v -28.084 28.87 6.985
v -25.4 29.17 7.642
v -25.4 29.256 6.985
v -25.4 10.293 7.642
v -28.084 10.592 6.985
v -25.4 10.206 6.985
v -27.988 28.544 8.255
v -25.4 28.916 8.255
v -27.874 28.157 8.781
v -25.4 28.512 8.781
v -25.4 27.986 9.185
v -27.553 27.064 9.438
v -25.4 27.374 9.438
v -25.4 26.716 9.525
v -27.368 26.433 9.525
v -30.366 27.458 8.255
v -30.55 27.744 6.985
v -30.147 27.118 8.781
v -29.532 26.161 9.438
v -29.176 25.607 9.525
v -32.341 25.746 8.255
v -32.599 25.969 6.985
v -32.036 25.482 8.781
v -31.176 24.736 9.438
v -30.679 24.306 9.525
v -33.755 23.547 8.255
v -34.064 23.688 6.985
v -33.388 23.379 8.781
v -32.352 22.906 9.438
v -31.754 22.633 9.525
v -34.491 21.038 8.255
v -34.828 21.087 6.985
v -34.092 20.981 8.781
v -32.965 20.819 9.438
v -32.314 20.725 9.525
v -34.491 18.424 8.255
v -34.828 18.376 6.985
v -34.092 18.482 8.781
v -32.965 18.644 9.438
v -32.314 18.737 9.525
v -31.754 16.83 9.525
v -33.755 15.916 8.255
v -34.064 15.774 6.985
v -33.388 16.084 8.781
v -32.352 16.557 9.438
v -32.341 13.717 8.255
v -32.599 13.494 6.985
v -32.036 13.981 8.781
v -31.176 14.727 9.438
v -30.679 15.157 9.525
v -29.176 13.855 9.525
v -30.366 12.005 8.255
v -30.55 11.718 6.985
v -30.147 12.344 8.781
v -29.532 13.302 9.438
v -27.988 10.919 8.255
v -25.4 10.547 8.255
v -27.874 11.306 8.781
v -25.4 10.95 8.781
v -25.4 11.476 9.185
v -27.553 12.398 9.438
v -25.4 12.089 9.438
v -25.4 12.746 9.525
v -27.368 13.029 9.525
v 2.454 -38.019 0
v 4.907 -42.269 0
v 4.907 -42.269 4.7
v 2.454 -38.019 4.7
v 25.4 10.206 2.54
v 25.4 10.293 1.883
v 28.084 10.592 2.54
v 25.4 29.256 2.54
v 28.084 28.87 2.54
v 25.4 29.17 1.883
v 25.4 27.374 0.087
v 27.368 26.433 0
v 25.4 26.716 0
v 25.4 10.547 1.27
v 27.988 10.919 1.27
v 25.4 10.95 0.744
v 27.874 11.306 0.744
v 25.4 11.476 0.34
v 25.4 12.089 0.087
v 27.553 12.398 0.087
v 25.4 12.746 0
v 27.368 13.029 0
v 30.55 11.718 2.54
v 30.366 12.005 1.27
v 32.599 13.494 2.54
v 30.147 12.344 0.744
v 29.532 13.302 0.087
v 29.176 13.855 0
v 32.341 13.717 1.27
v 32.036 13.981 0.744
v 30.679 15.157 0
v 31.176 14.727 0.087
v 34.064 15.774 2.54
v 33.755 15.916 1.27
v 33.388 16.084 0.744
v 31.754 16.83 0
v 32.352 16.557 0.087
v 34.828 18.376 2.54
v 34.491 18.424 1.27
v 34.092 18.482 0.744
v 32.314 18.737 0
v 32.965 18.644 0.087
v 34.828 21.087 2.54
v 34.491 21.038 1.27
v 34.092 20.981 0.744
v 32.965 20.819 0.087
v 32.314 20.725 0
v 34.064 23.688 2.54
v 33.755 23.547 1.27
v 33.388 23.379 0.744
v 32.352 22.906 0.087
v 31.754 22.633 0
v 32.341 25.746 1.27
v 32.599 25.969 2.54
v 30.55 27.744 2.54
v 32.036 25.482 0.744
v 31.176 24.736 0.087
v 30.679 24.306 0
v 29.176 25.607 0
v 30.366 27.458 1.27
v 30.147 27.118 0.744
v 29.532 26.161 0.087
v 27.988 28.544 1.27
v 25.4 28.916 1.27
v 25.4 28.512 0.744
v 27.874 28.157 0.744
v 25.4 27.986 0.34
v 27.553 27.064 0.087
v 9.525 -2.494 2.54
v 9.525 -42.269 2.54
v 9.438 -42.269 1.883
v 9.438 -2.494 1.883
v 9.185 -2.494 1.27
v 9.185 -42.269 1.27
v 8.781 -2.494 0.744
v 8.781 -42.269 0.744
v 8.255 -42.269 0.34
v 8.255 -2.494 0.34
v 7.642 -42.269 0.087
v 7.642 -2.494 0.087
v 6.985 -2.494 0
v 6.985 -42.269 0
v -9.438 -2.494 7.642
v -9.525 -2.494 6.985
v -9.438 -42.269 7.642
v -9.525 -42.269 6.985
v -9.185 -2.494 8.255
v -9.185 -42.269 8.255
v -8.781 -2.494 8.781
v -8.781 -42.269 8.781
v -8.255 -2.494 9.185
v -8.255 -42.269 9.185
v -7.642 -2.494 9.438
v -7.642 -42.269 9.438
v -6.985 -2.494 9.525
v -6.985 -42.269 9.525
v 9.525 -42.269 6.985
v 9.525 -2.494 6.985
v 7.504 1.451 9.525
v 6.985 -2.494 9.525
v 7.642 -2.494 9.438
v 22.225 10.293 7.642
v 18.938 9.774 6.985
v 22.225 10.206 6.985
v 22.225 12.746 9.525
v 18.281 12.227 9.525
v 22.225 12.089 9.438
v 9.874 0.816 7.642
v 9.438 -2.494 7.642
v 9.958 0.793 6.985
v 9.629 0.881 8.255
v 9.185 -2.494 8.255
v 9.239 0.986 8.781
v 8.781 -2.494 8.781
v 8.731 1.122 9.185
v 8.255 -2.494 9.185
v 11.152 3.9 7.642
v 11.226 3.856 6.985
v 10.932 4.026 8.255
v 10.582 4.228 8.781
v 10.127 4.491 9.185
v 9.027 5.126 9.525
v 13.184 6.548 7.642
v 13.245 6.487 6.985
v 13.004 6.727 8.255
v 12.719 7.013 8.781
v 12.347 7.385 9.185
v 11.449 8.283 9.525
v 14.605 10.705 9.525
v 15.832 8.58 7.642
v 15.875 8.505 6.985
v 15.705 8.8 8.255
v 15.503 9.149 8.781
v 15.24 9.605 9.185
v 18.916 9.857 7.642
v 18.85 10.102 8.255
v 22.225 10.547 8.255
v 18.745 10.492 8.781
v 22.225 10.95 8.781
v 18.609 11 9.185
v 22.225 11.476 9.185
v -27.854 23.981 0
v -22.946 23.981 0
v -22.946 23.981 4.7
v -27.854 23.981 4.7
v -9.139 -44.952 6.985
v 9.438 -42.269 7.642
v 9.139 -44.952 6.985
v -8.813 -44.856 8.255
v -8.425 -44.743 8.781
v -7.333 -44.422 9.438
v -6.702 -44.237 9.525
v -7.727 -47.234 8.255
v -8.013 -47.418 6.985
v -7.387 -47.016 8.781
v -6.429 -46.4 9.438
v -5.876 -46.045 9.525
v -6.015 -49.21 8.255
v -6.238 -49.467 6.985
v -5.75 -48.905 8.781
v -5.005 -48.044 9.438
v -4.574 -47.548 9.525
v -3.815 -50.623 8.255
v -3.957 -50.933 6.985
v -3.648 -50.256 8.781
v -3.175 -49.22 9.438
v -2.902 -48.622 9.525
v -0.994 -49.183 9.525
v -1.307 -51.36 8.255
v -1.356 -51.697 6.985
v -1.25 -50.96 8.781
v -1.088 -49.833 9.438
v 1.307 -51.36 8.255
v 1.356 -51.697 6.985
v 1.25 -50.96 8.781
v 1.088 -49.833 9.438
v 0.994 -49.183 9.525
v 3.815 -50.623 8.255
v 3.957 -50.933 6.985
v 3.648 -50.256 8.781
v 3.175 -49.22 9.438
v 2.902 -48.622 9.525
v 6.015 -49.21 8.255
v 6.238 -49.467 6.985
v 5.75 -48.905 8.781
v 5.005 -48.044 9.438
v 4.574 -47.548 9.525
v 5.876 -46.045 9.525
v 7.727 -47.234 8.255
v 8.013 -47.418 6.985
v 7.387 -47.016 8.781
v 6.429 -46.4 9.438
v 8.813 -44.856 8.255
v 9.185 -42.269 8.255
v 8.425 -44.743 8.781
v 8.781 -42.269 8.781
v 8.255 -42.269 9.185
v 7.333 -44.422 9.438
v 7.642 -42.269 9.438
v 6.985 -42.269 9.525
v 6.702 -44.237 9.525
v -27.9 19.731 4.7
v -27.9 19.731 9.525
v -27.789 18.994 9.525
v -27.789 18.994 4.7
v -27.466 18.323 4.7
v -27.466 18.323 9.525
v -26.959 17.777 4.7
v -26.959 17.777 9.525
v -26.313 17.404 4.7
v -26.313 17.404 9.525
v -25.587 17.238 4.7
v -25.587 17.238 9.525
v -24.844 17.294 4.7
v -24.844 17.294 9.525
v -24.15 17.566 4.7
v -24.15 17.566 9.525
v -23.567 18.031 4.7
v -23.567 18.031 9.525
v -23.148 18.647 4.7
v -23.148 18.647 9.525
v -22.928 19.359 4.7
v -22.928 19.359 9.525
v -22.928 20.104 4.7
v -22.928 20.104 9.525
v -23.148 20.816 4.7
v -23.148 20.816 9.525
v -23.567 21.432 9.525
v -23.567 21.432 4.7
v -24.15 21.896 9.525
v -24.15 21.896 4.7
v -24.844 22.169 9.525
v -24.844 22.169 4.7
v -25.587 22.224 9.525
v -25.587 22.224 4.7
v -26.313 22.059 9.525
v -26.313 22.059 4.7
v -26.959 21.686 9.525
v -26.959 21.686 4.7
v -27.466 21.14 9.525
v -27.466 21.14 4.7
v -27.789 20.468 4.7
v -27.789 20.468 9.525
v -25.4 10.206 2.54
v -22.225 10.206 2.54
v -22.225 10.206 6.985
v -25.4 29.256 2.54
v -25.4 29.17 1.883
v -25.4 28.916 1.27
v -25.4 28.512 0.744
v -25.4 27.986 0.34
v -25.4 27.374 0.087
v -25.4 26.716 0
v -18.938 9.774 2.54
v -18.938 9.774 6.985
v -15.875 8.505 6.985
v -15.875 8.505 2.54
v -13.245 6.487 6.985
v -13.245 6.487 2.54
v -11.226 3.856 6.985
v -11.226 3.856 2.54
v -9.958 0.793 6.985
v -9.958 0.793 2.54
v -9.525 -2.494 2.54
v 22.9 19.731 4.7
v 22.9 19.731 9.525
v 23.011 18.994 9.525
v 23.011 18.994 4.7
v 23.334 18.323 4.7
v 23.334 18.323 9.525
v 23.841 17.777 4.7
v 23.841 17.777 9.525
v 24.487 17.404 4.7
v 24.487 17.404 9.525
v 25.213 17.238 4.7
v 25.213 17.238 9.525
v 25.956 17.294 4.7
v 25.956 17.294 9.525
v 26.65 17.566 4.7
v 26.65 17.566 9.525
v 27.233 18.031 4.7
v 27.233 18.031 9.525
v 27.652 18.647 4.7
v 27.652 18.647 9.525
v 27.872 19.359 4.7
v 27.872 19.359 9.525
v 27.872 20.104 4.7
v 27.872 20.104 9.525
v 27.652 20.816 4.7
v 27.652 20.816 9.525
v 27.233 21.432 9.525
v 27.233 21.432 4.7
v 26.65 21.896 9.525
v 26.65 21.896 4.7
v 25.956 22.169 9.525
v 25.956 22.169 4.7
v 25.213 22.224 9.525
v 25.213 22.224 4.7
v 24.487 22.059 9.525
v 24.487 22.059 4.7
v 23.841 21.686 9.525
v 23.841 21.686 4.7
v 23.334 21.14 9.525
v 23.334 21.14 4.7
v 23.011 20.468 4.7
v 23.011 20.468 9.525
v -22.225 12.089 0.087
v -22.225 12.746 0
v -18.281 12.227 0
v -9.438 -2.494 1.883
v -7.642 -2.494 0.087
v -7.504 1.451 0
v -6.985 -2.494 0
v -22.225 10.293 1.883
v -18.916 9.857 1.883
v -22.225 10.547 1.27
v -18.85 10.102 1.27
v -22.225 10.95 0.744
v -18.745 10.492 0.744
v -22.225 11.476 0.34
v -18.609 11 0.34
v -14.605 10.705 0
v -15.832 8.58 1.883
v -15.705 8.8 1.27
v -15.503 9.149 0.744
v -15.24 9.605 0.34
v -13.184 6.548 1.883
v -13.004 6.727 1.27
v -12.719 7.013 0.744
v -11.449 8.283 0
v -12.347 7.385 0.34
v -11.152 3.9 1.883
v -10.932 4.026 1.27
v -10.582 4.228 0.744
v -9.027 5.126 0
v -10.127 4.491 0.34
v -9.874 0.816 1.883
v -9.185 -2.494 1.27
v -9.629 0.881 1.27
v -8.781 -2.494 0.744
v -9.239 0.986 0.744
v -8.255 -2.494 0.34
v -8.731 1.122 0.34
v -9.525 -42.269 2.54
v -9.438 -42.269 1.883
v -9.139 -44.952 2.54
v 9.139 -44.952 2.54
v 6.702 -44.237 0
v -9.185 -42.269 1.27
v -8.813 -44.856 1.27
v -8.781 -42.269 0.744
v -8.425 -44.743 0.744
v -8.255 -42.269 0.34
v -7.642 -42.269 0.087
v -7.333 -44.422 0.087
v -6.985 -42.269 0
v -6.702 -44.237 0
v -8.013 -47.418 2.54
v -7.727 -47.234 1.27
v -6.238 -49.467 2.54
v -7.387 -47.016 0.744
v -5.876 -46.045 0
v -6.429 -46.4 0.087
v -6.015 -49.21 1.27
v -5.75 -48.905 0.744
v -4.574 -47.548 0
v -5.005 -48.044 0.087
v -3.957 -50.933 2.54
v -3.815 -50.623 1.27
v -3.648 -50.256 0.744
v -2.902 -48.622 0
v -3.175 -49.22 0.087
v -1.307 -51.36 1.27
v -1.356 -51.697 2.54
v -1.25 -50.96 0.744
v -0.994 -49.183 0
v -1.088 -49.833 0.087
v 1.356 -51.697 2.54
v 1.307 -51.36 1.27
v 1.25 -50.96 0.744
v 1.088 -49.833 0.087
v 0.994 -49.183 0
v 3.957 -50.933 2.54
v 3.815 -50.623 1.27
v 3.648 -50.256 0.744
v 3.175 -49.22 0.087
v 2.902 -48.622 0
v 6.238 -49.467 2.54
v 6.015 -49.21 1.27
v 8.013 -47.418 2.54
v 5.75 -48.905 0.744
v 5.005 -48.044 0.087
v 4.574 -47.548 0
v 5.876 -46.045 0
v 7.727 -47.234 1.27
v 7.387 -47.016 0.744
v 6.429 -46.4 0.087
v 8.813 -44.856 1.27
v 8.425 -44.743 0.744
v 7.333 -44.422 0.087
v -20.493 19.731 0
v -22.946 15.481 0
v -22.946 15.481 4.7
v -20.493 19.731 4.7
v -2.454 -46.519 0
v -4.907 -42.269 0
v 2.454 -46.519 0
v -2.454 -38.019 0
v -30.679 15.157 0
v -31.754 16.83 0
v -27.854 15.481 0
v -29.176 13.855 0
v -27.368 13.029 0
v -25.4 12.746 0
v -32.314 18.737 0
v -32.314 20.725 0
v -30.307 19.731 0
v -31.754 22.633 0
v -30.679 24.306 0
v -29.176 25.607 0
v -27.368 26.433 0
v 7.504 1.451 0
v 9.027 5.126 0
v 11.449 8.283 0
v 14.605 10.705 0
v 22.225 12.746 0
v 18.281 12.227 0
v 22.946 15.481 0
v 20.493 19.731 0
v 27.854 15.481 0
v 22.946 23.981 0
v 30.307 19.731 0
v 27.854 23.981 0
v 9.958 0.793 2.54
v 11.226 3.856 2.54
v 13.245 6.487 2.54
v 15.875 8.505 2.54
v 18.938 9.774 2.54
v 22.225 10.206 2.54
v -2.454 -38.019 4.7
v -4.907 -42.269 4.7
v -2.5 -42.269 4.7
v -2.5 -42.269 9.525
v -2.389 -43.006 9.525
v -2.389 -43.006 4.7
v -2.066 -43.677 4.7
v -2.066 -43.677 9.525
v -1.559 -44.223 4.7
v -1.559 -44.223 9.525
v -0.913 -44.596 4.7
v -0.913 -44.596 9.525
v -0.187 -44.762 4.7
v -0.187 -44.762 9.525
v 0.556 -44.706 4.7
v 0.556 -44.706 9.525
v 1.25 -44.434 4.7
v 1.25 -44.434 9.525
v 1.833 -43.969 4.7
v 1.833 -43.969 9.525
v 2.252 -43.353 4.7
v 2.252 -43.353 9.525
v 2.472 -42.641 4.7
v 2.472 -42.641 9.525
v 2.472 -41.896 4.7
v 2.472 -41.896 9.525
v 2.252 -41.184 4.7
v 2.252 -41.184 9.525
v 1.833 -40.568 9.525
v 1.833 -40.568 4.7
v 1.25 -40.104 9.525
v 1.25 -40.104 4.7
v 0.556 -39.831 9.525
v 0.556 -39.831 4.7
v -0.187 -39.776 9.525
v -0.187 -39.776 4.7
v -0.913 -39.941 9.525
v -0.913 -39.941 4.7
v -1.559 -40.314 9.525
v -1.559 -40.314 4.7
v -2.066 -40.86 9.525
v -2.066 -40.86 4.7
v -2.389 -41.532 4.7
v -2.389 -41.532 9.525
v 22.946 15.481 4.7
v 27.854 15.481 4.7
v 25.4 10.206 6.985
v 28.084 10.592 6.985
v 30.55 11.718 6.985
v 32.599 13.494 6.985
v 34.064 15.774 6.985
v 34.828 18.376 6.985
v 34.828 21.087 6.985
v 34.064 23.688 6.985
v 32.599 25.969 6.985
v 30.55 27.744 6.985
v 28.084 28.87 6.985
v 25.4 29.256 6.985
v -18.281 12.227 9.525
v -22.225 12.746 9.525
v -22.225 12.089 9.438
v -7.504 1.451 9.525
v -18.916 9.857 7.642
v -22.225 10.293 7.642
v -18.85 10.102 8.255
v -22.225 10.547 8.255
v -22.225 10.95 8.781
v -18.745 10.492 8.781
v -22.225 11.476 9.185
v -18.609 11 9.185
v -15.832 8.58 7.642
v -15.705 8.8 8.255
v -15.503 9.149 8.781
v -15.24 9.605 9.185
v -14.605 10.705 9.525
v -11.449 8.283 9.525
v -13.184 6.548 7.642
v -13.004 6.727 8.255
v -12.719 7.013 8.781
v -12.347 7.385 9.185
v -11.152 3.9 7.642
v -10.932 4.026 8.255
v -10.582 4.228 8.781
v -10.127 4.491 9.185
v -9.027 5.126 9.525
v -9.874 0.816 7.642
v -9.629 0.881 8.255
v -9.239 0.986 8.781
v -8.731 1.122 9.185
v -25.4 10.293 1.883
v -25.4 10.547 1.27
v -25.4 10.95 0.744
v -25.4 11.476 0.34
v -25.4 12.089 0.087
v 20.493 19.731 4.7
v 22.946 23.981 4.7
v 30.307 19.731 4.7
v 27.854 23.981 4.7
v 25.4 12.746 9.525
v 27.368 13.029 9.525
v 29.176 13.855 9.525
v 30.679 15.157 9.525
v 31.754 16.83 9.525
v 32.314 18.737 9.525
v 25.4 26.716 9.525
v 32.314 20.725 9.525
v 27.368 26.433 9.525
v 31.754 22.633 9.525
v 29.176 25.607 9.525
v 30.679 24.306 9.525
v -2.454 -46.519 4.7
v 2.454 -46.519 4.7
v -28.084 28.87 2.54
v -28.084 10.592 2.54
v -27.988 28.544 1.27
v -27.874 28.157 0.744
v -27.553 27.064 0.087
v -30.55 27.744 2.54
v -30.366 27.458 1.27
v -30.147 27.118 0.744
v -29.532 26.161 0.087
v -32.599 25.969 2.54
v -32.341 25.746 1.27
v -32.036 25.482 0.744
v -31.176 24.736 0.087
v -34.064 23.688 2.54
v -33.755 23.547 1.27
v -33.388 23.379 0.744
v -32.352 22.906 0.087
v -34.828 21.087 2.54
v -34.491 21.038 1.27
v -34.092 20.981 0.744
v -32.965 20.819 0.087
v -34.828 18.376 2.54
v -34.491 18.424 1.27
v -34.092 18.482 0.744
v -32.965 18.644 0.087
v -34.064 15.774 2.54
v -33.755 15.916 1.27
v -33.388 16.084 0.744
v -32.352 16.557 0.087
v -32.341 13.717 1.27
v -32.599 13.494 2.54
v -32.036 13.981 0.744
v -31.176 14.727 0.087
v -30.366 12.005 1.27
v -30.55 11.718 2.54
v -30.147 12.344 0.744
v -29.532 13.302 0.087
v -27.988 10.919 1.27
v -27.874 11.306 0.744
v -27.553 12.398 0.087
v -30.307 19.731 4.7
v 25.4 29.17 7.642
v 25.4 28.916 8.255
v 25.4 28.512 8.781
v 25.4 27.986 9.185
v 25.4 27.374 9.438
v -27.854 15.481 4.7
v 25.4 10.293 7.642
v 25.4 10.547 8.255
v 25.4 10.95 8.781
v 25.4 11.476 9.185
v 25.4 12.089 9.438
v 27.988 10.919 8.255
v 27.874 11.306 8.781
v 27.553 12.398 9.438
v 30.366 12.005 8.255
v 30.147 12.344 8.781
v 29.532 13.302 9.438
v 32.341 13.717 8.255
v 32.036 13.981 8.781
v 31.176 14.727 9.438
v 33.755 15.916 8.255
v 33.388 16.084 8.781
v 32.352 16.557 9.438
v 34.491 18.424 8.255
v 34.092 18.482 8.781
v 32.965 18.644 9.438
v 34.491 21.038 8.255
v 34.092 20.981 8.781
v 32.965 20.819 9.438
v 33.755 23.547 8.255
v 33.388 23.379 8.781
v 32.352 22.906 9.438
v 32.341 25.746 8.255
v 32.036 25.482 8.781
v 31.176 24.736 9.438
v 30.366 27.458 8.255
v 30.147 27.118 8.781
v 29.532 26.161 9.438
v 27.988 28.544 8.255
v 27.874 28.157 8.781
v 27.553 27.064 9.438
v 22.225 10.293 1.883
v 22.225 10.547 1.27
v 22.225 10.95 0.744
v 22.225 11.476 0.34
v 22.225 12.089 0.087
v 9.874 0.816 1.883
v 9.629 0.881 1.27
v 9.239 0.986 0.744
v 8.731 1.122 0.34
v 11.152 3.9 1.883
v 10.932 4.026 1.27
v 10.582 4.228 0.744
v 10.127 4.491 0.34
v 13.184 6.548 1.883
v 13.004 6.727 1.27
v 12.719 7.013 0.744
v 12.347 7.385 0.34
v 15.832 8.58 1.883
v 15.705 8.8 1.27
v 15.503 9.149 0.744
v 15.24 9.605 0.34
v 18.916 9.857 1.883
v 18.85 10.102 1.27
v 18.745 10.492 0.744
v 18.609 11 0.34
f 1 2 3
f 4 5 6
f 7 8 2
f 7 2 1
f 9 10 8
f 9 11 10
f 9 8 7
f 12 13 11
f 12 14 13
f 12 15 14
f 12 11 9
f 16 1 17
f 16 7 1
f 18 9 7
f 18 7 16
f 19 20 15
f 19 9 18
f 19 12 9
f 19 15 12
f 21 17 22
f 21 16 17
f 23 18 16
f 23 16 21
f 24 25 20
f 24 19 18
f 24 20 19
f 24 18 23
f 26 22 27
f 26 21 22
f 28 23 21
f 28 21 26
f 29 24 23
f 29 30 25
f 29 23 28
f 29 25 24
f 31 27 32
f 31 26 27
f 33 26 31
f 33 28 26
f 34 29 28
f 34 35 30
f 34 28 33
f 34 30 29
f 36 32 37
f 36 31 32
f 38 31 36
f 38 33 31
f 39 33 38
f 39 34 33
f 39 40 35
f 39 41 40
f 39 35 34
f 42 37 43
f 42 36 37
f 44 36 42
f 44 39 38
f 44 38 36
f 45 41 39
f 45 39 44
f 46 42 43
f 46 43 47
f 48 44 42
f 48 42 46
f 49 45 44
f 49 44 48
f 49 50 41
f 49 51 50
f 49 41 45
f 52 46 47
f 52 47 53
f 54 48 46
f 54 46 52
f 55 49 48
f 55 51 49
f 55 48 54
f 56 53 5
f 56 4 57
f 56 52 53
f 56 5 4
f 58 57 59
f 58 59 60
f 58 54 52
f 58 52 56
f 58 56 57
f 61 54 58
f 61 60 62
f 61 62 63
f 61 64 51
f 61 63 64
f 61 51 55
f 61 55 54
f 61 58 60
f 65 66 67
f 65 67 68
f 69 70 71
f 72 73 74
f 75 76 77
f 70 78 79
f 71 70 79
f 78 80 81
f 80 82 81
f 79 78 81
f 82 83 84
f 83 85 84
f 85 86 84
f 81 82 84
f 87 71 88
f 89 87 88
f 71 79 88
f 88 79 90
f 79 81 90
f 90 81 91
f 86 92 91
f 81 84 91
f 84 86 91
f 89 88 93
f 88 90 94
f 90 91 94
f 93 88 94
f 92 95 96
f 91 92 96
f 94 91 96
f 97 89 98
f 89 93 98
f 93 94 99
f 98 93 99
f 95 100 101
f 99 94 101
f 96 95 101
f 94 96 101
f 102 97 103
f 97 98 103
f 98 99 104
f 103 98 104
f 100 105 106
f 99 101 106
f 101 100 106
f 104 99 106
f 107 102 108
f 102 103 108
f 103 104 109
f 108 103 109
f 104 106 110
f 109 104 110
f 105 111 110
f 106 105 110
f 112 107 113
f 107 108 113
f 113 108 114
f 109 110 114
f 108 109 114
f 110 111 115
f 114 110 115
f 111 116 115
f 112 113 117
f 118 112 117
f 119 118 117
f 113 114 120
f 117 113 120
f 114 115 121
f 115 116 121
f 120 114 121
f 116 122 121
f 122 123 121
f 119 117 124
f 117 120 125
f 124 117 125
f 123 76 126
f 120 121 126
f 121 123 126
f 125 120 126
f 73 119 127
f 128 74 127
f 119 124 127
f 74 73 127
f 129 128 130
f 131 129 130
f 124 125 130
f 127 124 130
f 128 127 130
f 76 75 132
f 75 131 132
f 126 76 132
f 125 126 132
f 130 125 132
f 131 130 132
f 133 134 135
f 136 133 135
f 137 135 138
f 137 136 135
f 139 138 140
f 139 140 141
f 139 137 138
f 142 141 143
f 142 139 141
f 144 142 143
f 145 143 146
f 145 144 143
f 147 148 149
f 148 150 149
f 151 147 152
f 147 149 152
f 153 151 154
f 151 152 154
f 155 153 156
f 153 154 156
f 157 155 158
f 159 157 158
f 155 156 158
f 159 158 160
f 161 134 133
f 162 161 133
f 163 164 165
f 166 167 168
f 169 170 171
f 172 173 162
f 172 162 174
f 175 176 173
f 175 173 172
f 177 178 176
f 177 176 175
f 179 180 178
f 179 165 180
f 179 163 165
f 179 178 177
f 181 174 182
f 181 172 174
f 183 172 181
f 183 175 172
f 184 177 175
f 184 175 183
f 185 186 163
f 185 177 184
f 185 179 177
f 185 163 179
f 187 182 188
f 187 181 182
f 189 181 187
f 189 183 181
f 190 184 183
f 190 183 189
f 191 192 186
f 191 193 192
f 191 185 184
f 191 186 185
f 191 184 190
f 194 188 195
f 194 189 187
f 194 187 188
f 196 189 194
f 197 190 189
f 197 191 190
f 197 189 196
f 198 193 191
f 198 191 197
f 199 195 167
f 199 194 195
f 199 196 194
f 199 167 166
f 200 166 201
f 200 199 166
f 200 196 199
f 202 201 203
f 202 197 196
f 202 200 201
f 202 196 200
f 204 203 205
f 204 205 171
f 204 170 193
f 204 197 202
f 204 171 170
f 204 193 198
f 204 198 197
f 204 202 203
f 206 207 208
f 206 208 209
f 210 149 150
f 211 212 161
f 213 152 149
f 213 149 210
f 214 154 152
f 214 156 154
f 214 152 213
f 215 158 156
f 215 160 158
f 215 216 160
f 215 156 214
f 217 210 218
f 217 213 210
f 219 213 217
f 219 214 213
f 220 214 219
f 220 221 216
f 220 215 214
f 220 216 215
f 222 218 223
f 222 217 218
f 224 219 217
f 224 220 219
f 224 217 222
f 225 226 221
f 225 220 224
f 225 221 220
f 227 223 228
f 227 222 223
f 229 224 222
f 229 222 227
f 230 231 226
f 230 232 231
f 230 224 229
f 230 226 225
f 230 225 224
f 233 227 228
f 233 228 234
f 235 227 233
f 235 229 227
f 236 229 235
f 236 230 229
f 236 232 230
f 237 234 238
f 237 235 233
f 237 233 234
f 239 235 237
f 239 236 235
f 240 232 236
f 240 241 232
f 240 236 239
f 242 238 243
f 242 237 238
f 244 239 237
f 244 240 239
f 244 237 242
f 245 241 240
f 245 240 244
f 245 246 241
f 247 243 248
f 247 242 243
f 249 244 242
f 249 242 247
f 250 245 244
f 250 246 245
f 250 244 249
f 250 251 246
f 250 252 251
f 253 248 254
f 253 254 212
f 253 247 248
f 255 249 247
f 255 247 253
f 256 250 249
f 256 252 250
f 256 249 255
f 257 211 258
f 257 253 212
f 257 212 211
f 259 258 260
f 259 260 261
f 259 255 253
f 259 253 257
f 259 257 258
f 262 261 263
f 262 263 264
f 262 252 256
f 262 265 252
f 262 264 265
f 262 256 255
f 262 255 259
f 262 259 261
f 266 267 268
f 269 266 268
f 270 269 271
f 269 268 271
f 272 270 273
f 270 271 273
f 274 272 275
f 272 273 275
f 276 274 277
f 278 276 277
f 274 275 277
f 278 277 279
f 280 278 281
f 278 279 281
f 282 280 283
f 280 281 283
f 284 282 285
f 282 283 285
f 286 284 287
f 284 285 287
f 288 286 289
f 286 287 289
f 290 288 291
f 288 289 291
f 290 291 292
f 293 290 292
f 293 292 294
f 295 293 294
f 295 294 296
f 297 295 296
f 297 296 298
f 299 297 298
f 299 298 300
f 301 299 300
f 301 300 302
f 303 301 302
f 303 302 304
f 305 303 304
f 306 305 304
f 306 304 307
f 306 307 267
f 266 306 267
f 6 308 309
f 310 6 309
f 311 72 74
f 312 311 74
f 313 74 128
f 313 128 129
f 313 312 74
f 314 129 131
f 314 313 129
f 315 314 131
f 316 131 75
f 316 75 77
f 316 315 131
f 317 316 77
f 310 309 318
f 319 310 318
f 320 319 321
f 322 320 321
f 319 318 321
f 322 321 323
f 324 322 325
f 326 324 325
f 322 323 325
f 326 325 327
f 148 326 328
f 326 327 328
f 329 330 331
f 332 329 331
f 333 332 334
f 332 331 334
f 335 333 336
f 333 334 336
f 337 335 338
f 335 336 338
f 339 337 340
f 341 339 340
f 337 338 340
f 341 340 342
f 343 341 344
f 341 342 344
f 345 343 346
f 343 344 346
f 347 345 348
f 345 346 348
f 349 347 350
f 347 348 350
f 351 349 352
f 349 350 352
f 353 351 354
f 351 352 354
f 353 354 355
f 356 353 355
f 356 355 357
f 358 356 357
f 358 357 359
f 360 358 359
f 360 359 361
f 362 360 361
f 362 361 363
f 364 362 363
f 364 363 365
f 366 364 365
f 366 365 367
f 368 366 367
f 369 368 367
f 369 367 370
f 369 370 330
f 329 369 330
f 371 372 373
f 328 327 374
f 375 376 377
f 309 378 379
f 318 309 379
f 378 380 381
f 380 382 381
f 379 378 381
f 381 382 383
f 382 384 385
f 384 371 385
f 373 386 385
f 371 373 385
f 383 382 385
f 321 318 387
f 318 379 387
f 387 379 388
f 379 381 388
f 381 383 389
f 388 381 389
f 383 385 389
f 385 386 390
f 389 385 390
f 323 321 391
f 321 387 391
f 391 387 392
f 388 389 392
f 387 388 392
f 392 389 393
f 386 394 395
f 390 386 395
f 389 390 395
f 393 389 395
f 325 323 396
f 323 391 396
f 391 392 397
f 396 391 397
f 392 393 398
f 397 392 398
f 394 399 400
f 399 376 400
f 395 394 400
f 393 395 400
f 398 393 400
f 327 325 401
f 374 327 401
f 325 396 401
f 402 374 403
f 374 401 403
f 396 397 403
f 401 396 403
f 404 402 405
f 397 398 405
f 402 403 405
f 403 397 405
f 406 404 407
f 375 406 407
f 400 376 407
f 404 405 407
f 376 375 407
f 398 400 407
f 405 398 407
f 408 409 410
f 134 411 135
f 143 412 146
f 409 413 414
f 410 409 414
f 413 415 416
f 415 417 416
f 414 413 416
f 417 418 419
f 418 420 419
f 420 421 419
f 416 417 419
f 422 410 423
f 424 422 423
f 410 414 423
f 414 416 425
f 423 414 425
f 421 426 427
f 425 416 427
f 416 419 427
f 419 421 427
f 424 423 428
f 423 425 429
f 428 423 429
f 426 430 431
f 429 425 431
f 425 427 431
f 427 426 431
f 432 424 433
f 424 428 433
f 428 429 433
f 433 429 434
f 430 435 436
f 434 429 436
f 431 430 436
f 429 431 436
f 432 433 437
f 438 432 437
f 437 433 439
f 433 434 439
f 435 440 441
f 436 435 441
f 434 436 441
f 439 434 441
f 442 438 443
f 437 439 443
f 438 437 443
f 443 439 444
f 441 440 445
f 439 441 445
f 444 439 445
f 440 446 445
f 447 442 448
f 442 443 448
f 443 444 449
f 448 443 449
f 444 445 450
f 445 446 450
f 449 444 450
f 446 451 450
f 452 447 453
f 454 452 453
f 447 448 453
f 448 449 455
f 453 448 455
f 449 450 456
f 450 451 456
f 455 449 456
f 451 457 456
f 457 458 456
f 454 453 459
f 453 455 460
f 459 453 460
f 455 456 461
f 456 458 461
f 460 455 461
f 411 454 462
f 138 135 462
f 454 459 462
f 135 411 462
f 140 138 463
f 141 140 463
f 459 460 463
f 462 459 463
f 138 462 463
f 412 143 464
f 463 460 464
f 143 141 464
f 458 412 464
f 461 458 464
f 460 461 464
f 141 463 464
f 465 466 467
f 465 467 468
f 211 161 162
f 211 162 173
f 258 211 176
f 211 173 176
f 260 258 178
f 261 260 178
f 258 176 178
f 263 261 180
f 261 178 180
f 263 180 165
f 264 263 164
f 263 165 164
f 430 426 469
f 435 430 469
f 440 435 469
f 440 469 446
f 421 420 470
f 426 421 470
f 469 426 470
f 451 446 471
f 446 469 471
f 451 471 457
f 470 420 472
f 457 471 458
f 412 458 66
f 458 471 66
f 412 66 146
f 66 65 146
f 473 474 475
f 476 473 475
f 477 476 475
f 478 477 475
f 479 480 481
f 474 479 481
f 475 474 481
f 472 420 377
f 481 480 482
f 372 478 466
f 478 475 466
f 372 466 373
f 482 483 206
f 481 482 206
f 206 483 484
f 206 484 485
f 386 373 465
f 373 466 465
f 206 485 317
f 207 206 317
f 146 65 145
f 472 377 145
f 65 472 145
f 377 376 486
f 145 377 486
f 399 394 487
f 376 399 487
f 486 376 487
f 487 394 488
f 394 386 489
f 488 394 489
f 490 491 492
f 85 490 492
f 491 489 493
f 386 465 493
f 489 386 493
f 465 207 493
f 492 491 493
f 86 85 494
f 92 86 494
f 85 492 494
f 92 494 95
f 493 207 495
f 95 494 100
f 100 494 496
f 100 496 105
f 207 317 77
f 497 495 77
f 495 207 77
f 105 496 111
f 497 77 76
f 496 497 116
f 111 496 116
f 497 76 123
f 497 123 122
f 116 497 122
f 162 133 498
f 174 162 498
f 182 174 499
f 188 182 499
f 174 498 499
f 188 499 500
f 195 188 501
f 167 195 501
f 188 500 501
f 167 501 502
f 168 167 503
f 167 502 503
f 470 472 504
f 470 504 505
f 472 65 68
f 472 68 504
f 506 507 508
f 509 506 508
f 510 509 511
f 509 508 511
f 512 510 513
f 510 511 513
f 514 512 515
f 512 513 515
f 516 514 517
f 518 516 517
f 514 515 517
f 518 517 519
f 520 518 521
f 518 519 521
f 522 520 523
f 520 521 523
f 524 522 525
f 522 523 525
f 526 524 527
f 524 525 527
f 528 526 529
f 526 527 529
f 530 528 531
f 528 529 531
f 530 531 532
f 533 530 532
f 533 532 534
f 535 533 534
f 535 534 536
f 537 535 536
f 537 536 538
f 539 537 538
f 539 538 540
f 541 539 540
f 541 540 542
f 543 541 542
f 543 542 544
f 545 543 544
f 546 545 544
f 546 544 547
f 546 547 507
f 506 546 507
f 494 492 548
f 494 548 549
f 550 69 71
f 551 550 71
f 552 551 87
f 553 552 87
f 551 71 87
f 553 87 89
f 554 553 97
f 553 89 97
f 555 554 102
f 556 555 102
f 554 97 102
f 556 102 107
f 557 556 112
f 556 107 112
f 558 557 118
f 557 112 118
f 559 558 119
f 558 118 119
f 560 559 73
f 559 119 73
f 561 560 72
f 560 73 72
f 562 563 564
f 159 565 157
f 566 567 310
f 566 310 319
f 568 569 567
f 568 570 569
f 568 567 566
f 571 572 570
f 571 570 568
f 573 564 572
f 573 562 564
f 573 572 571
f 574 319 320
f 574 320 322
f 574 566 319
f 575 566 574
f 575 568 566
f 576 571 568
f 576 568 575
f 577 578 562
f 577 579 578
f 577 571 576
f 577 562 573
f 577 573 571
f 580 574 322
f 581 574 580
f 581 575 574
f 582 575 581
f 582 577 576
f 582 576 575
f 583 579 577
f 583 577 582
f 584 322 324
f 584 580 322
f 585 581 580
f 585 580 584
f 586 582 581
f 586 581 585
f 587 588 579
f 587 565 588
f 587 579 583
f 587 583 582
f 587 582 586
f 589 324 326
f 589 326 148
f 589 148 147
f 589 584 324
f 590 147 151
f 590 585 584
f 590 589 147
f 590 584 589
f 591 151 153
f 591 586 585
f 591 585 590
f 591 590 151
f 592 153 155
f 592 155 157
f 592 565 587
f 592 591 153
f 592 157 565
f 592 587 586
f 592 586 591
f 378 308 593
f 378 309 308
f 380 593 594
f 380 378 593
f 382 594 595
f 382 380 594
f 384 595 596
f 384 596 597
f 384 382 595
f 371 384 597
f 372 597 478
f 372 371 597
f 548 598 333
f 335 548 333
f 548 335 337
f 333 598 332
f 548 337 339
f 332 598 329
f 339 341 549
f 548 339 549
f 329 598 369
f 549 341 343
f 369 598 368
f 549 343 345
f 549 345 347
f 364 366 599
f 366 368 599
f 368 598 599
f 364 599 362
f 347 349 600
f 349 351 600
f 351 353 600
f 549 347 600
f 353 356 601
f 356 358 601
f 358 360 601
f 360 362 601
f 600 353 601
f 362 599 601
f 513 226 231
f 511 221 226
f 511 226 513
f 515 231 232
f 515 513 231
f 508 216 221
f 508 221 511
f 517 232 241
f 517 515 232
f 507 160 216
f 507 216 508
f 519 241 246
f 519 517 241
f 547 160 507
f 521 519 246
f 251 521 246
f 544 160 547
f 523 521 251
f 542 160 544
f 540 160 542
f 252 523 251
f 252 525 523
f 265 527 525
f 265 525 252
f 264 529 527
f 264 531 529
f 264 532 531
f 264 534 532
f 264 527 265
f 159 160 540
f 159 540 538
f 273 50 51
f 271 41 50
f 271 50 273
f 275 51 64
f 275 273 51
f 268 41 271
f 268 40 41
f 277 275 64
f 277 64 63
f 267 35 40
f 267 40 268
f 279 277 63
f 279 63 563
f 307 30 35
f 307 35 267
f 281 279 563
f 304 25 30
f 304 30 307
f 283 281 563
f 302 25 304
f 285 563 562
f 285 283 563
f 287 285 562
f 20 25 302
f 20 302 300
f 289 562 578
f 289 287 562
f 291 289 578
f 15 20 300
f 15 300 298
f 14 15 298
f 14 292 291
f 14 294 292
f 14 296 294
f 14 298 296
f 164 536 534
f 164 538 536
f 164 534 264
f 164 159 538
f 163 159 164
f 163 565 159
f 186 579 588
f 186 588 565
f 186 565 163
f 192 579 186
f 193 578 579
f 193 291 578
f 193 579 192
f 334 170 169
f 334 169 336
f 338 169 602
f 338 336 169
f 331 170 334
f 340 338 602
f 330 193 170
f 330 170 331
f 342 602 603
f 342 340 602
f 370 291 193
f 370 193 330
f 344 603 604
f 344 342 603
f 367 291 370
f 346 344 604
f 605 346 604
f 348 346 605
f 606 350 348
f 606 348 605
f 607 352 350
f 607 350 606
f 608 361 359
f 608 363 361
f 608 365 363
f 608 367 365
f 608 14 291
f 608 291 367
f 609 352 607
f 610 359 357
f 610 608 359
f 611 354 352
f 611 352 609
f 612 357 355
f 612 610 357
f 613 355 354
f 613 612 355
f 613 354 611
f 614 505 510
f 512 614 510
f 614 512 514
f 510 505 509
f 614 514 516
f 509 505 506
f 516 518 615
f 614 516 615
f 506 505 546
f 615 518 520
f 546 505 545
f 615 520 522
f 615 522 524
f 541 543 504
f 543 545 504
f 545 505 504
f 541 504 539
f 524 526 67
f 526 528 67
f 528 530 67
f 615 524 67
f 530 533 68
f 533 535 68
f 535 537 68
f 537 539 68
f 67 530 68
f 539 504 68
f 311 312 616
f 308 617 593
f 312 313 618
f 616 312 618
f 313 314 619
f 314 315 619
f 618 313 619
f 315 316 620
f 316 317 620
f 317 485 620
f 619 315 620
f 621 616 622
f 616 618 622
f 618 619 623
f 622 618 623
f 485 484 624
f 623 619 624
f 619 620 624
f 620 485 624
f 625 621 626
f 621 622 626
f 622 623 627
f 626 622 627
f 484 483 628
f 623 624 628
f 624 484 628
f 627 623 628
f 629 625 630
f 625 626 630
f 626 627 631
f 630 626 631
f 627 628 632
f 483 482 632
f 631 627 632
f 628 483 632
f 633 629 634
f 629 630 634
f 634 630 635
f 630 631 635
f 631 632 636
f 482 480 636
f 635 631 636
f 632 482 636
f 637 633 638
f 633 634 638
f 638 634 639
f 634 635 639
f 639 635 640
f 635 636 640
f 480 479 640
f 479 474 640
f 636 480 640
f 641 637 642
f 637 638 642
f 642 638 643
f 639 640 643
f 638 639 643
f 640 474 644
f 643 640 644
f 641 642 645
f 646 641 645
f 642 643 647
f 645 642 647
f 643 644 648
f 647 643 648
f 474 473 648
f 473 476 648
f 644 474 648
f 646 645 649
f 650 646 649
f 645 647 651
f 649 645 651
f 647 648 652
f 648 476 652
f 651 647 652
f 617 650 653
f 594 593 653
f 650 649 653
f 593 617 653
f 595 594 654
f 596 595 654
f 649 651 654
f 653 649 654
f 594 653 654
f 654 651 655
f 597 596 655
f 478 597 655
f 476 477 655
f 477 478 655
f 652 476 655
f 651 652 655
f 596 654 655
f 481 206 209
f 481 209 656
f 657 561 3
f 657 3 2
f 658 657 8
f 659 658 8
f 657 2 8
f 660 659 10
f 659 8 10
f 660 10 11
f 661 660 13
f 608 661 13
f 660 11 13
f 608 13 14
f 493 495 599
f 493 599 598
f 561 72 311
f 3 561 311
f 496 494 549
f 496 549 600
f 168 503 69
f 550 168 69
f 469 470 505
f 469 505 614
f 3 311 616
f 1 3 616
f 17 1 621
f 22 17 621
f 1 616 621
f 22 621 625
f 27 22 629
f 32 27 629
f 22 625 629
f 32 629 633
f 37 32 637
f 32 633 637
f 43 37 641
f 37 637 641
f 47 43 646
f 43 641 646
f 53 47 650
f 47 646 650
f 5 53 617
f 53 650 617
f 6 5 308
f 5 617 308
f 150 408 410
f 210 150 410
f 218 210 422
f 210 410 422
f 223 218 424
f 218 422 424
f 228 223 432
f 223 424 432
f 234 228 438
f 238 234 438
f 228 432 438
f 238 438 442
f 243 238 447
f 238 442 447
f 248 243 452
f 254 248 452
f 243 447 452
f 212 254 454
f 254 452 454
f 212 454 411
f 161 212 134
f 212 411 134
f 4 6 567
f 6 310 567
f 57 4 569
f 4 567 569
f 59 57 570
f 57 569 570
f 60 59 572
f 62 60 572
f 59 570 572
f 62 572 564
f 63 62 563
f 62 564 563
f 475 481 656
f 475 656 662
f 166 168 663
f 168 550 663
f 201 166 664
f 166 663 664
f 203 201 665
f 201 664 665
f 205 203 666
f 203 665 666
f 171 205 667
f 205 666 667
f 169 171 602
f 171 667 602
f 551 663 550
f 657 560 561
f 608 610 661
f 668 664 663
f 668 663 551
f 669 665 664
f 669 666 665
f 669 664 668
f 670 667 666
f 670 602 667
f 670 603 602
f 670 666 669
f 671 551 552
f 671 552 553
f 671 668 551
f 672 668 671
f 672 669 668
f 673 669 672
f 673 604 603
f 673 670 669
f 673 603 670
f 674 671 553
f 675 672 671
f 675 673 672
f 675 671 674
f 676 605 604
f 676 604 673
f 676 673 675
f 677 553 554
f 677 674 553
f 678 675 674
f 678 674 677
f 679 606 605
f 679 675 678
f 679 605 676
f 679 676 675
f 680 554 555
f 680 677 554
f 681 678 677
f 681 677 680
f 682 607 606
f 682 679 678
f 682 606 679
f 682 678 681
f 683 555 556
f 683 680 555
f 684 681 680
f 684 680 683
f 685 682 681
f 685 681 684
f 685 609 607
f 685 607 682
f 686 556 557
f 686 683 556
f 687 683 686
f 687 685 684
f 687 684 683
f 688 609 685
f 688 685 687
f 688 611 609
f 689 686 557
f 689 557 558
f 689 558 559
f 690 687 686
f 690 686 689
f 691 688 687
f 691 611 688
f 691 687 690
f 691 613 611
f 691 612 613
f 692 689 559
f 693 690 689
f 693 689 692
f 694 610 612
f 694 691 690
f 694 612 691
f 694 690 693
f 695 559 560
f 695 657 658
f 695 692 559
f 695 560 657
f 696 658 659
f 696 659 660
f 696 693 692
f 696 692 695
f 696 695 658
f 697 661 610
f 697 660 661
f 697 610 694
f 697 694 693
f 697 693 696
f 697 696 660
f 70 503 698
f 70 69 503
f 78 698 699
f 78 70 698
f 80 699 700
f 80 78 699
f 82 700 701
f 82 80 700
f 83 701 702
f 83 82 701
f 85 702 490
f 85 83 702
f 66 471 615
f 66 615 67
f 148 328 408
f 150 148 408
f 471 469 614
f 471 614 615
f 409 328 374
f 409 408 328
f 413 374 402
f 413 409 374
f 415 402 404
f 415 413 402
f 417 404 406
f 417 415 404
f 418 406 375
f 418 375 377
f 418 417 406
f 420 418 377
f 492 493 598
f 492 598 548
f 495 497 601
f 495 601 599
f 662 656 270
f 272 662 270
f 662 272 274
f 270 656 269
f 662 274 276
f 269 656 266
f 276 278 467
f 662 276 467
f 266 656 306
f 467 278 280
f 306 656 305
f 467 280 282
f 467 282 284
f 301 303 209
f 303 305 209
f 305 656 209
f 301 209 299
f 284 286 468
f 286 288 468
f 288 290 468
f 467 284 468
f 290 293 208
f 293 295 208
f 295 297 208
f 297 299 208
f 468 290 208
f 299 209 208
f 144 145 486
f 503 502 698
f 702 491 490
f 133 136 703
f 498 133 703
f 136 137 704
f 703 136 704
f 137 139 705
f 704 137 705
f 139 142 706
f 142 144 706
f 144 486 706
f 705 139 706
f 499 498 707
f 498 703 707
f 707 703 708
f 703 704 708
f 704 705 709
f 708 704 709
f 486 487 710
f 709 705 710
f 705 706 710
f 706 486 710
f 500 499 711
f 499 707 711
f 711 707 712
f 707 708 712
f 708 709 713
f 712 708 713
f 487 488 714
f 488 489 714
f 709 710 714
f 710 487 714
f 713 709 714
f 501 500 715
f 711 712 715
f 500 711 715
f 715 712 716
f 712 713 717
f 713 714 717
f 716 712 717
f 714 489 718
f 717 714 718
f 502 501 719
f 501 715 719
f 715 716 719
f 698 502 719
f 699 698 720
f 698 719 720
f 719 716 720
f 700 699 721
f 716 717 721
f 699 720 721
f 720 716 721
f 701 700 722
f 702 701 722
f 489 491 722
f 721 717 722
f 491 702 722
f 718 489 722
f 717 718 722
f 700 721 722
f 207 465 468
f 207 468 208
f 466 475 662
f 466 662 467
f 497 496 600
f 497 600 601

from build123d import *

# Parameters (mm, degrees)
F1_DEPTH = 9.525
F2_D     = 5
F3_R     = 2.54
F4_DEPTH = 4.7


# Not quite as in the source:
# - a feature names something its author has since deleted; it is built from what else it names


with BuildPart() as f1:
    # F0 (on Top) → F1 (new body)
    with BuildSketch(Plane.XY):
        with BuildLine():
            Line((25.4, 29.2563221224), (-25.4, 29.2563221224))
            ThreePointArc((-25.4, 29.2563221224), (-34.925, 19.7313221224), (-25.4, 10.2063221224))
            Line((-25.4, 10.2063221224), (-22.225, 10.2063221224))
            ThreePointArc((-22.225, 10.2063221224), (-13.2447438789, 6.4865782435), (-9.525, -2.4936778776))
            Line((-9.525, -2.4936778776), (-9.525, -42.2686778776))
            ThreePointArc((-9.525, -42.2686778776), (0, -51.7936778776), (9.525, -42.2686778776))
            Line((9.525, -42.2686778776), (9.525, -2.4936778776))
            ThreePointArc((9.525, -2.4936778776), (13.2447438789, 6.4865782435), (22.225, 10.2063221224))
            Line((22.225, 10.2063221224), (25.4, 10.2063221224))
            ThreePointArc((25.4, 10.2063221224), (34.925, 19.7313221224), (25.4, 29.2563221224))
        make_face()
        Polygon((-4.9074772881, -42.2686778776), (-2.4537386441, -38.0186778776), (2.4537386441, -38.0186778776), (4.9074772881, -42.2686778776), (2.4537386441, -46.5186778776), (-2.4537386441, -46.5186778776), align=None, mode=Mode.SUBTRACT)
        Polygon((-20.4925227119, 19.7313221224), (-22.9462613559, 15.4813221224), (-27.8537386441, 15.4813221224), (-30.3074772881, 19.7313221224), (-27.8537386441, 23.9813221224), (-22.9462613559, 23.9813221224), align=None, mode=Mode.SUBTRACT)
        Polygon((30.3074772881, 19.7313221224), (27.8537386441, 15.4813221224), (22.9462613559, 15.4813221224), (20.4925227119, 19.7313221224), (22.9462613559, 23.9813221224), (27.8537386441, 23.9813221224), align=None, mode=Mode.SUBTRACT)
        Polygon((2.4537386441, -38.0186778776), (-2.4537386441, -38.0186778776), (-4.9074772881, -42.2686778776), (-2.4537386441, -46.5186778776), (2.4537386441, -46.5186778776), (4.9074772881, -42.2686778776), align=None)
        Polygon((-27.8537386441, 15.4813221224), (-22.9462613559, 15.4813221224), (-20.4925227119, 19.7313221224), (-22.9462613559, 23.9813221224), (-27.8537386441, 23.9813221224), (-30.3074772881, 19.7313221224), align=None)
        Polygon((22.9462613559, 15.4813221224), (27.8537386441, 15.4813221224), (30.3074772881, 19.7313221224), (27.8537386441, 23.9813221224), (22.9462613559, 23.9813221224), (20.4925227119, 19.7313221224), align=None)
    extrude(amount=F1_DEPTH)

    # F2 (through all)
    with Locations(Plane(origin=(0, 0, 0), x_dir=(1, 0, 0), z_dir=(0, 0, -1))):
        with Locations((25.4, -19.7313221224), (-25.4, -19.7313221224), (0, 42.2686778776)):
            Hole(F2_D / 2)

    # F3
    f3_edges = [f1.edges().sort_by_distance(p)[0] for p in [
        (0, 29.256322, 0),
        (0, 29.256322, 9.525),
    ]]
    fillet(f3_edges, radius=F3_R)

    # F0 (on Top) → F4 (cut)
    with BuildSketch(Plane.XY):
        Polygon((2.4537386441, -38.0186778776), (-2.4537386441, -38.0186778776), (-4.9074772881, -42.2686778776), (-2.4537386441, -46.5186778776), (2.4537386441, -46.5186778776), (4.9074772881, -42.2686778776), align=None)
        Polygon((-27.8537386441, 15.4813221224), (-22.9462613559, 15.4813221224), (-20.4925227119, 19.7313221224), (-22.9462613559, 23.9813221224), (-27.8537386441, 23.9813221224), (-30.3074772881, 19.7313221224), align=None)
        Polygon((22.9462613559, 15.4813221224), (27.8537386441, 15.4813221224), (30.3074772881, 19.7313221224), (27.8537386441, 23.9813221224), (22.9462613559, 23.9813221224), (20.4925227119, 19.7313221224), align=None)
    extrude(amount=F4_DEPTH, mode=Mode.SUBTRACT)


solid = f1.part
